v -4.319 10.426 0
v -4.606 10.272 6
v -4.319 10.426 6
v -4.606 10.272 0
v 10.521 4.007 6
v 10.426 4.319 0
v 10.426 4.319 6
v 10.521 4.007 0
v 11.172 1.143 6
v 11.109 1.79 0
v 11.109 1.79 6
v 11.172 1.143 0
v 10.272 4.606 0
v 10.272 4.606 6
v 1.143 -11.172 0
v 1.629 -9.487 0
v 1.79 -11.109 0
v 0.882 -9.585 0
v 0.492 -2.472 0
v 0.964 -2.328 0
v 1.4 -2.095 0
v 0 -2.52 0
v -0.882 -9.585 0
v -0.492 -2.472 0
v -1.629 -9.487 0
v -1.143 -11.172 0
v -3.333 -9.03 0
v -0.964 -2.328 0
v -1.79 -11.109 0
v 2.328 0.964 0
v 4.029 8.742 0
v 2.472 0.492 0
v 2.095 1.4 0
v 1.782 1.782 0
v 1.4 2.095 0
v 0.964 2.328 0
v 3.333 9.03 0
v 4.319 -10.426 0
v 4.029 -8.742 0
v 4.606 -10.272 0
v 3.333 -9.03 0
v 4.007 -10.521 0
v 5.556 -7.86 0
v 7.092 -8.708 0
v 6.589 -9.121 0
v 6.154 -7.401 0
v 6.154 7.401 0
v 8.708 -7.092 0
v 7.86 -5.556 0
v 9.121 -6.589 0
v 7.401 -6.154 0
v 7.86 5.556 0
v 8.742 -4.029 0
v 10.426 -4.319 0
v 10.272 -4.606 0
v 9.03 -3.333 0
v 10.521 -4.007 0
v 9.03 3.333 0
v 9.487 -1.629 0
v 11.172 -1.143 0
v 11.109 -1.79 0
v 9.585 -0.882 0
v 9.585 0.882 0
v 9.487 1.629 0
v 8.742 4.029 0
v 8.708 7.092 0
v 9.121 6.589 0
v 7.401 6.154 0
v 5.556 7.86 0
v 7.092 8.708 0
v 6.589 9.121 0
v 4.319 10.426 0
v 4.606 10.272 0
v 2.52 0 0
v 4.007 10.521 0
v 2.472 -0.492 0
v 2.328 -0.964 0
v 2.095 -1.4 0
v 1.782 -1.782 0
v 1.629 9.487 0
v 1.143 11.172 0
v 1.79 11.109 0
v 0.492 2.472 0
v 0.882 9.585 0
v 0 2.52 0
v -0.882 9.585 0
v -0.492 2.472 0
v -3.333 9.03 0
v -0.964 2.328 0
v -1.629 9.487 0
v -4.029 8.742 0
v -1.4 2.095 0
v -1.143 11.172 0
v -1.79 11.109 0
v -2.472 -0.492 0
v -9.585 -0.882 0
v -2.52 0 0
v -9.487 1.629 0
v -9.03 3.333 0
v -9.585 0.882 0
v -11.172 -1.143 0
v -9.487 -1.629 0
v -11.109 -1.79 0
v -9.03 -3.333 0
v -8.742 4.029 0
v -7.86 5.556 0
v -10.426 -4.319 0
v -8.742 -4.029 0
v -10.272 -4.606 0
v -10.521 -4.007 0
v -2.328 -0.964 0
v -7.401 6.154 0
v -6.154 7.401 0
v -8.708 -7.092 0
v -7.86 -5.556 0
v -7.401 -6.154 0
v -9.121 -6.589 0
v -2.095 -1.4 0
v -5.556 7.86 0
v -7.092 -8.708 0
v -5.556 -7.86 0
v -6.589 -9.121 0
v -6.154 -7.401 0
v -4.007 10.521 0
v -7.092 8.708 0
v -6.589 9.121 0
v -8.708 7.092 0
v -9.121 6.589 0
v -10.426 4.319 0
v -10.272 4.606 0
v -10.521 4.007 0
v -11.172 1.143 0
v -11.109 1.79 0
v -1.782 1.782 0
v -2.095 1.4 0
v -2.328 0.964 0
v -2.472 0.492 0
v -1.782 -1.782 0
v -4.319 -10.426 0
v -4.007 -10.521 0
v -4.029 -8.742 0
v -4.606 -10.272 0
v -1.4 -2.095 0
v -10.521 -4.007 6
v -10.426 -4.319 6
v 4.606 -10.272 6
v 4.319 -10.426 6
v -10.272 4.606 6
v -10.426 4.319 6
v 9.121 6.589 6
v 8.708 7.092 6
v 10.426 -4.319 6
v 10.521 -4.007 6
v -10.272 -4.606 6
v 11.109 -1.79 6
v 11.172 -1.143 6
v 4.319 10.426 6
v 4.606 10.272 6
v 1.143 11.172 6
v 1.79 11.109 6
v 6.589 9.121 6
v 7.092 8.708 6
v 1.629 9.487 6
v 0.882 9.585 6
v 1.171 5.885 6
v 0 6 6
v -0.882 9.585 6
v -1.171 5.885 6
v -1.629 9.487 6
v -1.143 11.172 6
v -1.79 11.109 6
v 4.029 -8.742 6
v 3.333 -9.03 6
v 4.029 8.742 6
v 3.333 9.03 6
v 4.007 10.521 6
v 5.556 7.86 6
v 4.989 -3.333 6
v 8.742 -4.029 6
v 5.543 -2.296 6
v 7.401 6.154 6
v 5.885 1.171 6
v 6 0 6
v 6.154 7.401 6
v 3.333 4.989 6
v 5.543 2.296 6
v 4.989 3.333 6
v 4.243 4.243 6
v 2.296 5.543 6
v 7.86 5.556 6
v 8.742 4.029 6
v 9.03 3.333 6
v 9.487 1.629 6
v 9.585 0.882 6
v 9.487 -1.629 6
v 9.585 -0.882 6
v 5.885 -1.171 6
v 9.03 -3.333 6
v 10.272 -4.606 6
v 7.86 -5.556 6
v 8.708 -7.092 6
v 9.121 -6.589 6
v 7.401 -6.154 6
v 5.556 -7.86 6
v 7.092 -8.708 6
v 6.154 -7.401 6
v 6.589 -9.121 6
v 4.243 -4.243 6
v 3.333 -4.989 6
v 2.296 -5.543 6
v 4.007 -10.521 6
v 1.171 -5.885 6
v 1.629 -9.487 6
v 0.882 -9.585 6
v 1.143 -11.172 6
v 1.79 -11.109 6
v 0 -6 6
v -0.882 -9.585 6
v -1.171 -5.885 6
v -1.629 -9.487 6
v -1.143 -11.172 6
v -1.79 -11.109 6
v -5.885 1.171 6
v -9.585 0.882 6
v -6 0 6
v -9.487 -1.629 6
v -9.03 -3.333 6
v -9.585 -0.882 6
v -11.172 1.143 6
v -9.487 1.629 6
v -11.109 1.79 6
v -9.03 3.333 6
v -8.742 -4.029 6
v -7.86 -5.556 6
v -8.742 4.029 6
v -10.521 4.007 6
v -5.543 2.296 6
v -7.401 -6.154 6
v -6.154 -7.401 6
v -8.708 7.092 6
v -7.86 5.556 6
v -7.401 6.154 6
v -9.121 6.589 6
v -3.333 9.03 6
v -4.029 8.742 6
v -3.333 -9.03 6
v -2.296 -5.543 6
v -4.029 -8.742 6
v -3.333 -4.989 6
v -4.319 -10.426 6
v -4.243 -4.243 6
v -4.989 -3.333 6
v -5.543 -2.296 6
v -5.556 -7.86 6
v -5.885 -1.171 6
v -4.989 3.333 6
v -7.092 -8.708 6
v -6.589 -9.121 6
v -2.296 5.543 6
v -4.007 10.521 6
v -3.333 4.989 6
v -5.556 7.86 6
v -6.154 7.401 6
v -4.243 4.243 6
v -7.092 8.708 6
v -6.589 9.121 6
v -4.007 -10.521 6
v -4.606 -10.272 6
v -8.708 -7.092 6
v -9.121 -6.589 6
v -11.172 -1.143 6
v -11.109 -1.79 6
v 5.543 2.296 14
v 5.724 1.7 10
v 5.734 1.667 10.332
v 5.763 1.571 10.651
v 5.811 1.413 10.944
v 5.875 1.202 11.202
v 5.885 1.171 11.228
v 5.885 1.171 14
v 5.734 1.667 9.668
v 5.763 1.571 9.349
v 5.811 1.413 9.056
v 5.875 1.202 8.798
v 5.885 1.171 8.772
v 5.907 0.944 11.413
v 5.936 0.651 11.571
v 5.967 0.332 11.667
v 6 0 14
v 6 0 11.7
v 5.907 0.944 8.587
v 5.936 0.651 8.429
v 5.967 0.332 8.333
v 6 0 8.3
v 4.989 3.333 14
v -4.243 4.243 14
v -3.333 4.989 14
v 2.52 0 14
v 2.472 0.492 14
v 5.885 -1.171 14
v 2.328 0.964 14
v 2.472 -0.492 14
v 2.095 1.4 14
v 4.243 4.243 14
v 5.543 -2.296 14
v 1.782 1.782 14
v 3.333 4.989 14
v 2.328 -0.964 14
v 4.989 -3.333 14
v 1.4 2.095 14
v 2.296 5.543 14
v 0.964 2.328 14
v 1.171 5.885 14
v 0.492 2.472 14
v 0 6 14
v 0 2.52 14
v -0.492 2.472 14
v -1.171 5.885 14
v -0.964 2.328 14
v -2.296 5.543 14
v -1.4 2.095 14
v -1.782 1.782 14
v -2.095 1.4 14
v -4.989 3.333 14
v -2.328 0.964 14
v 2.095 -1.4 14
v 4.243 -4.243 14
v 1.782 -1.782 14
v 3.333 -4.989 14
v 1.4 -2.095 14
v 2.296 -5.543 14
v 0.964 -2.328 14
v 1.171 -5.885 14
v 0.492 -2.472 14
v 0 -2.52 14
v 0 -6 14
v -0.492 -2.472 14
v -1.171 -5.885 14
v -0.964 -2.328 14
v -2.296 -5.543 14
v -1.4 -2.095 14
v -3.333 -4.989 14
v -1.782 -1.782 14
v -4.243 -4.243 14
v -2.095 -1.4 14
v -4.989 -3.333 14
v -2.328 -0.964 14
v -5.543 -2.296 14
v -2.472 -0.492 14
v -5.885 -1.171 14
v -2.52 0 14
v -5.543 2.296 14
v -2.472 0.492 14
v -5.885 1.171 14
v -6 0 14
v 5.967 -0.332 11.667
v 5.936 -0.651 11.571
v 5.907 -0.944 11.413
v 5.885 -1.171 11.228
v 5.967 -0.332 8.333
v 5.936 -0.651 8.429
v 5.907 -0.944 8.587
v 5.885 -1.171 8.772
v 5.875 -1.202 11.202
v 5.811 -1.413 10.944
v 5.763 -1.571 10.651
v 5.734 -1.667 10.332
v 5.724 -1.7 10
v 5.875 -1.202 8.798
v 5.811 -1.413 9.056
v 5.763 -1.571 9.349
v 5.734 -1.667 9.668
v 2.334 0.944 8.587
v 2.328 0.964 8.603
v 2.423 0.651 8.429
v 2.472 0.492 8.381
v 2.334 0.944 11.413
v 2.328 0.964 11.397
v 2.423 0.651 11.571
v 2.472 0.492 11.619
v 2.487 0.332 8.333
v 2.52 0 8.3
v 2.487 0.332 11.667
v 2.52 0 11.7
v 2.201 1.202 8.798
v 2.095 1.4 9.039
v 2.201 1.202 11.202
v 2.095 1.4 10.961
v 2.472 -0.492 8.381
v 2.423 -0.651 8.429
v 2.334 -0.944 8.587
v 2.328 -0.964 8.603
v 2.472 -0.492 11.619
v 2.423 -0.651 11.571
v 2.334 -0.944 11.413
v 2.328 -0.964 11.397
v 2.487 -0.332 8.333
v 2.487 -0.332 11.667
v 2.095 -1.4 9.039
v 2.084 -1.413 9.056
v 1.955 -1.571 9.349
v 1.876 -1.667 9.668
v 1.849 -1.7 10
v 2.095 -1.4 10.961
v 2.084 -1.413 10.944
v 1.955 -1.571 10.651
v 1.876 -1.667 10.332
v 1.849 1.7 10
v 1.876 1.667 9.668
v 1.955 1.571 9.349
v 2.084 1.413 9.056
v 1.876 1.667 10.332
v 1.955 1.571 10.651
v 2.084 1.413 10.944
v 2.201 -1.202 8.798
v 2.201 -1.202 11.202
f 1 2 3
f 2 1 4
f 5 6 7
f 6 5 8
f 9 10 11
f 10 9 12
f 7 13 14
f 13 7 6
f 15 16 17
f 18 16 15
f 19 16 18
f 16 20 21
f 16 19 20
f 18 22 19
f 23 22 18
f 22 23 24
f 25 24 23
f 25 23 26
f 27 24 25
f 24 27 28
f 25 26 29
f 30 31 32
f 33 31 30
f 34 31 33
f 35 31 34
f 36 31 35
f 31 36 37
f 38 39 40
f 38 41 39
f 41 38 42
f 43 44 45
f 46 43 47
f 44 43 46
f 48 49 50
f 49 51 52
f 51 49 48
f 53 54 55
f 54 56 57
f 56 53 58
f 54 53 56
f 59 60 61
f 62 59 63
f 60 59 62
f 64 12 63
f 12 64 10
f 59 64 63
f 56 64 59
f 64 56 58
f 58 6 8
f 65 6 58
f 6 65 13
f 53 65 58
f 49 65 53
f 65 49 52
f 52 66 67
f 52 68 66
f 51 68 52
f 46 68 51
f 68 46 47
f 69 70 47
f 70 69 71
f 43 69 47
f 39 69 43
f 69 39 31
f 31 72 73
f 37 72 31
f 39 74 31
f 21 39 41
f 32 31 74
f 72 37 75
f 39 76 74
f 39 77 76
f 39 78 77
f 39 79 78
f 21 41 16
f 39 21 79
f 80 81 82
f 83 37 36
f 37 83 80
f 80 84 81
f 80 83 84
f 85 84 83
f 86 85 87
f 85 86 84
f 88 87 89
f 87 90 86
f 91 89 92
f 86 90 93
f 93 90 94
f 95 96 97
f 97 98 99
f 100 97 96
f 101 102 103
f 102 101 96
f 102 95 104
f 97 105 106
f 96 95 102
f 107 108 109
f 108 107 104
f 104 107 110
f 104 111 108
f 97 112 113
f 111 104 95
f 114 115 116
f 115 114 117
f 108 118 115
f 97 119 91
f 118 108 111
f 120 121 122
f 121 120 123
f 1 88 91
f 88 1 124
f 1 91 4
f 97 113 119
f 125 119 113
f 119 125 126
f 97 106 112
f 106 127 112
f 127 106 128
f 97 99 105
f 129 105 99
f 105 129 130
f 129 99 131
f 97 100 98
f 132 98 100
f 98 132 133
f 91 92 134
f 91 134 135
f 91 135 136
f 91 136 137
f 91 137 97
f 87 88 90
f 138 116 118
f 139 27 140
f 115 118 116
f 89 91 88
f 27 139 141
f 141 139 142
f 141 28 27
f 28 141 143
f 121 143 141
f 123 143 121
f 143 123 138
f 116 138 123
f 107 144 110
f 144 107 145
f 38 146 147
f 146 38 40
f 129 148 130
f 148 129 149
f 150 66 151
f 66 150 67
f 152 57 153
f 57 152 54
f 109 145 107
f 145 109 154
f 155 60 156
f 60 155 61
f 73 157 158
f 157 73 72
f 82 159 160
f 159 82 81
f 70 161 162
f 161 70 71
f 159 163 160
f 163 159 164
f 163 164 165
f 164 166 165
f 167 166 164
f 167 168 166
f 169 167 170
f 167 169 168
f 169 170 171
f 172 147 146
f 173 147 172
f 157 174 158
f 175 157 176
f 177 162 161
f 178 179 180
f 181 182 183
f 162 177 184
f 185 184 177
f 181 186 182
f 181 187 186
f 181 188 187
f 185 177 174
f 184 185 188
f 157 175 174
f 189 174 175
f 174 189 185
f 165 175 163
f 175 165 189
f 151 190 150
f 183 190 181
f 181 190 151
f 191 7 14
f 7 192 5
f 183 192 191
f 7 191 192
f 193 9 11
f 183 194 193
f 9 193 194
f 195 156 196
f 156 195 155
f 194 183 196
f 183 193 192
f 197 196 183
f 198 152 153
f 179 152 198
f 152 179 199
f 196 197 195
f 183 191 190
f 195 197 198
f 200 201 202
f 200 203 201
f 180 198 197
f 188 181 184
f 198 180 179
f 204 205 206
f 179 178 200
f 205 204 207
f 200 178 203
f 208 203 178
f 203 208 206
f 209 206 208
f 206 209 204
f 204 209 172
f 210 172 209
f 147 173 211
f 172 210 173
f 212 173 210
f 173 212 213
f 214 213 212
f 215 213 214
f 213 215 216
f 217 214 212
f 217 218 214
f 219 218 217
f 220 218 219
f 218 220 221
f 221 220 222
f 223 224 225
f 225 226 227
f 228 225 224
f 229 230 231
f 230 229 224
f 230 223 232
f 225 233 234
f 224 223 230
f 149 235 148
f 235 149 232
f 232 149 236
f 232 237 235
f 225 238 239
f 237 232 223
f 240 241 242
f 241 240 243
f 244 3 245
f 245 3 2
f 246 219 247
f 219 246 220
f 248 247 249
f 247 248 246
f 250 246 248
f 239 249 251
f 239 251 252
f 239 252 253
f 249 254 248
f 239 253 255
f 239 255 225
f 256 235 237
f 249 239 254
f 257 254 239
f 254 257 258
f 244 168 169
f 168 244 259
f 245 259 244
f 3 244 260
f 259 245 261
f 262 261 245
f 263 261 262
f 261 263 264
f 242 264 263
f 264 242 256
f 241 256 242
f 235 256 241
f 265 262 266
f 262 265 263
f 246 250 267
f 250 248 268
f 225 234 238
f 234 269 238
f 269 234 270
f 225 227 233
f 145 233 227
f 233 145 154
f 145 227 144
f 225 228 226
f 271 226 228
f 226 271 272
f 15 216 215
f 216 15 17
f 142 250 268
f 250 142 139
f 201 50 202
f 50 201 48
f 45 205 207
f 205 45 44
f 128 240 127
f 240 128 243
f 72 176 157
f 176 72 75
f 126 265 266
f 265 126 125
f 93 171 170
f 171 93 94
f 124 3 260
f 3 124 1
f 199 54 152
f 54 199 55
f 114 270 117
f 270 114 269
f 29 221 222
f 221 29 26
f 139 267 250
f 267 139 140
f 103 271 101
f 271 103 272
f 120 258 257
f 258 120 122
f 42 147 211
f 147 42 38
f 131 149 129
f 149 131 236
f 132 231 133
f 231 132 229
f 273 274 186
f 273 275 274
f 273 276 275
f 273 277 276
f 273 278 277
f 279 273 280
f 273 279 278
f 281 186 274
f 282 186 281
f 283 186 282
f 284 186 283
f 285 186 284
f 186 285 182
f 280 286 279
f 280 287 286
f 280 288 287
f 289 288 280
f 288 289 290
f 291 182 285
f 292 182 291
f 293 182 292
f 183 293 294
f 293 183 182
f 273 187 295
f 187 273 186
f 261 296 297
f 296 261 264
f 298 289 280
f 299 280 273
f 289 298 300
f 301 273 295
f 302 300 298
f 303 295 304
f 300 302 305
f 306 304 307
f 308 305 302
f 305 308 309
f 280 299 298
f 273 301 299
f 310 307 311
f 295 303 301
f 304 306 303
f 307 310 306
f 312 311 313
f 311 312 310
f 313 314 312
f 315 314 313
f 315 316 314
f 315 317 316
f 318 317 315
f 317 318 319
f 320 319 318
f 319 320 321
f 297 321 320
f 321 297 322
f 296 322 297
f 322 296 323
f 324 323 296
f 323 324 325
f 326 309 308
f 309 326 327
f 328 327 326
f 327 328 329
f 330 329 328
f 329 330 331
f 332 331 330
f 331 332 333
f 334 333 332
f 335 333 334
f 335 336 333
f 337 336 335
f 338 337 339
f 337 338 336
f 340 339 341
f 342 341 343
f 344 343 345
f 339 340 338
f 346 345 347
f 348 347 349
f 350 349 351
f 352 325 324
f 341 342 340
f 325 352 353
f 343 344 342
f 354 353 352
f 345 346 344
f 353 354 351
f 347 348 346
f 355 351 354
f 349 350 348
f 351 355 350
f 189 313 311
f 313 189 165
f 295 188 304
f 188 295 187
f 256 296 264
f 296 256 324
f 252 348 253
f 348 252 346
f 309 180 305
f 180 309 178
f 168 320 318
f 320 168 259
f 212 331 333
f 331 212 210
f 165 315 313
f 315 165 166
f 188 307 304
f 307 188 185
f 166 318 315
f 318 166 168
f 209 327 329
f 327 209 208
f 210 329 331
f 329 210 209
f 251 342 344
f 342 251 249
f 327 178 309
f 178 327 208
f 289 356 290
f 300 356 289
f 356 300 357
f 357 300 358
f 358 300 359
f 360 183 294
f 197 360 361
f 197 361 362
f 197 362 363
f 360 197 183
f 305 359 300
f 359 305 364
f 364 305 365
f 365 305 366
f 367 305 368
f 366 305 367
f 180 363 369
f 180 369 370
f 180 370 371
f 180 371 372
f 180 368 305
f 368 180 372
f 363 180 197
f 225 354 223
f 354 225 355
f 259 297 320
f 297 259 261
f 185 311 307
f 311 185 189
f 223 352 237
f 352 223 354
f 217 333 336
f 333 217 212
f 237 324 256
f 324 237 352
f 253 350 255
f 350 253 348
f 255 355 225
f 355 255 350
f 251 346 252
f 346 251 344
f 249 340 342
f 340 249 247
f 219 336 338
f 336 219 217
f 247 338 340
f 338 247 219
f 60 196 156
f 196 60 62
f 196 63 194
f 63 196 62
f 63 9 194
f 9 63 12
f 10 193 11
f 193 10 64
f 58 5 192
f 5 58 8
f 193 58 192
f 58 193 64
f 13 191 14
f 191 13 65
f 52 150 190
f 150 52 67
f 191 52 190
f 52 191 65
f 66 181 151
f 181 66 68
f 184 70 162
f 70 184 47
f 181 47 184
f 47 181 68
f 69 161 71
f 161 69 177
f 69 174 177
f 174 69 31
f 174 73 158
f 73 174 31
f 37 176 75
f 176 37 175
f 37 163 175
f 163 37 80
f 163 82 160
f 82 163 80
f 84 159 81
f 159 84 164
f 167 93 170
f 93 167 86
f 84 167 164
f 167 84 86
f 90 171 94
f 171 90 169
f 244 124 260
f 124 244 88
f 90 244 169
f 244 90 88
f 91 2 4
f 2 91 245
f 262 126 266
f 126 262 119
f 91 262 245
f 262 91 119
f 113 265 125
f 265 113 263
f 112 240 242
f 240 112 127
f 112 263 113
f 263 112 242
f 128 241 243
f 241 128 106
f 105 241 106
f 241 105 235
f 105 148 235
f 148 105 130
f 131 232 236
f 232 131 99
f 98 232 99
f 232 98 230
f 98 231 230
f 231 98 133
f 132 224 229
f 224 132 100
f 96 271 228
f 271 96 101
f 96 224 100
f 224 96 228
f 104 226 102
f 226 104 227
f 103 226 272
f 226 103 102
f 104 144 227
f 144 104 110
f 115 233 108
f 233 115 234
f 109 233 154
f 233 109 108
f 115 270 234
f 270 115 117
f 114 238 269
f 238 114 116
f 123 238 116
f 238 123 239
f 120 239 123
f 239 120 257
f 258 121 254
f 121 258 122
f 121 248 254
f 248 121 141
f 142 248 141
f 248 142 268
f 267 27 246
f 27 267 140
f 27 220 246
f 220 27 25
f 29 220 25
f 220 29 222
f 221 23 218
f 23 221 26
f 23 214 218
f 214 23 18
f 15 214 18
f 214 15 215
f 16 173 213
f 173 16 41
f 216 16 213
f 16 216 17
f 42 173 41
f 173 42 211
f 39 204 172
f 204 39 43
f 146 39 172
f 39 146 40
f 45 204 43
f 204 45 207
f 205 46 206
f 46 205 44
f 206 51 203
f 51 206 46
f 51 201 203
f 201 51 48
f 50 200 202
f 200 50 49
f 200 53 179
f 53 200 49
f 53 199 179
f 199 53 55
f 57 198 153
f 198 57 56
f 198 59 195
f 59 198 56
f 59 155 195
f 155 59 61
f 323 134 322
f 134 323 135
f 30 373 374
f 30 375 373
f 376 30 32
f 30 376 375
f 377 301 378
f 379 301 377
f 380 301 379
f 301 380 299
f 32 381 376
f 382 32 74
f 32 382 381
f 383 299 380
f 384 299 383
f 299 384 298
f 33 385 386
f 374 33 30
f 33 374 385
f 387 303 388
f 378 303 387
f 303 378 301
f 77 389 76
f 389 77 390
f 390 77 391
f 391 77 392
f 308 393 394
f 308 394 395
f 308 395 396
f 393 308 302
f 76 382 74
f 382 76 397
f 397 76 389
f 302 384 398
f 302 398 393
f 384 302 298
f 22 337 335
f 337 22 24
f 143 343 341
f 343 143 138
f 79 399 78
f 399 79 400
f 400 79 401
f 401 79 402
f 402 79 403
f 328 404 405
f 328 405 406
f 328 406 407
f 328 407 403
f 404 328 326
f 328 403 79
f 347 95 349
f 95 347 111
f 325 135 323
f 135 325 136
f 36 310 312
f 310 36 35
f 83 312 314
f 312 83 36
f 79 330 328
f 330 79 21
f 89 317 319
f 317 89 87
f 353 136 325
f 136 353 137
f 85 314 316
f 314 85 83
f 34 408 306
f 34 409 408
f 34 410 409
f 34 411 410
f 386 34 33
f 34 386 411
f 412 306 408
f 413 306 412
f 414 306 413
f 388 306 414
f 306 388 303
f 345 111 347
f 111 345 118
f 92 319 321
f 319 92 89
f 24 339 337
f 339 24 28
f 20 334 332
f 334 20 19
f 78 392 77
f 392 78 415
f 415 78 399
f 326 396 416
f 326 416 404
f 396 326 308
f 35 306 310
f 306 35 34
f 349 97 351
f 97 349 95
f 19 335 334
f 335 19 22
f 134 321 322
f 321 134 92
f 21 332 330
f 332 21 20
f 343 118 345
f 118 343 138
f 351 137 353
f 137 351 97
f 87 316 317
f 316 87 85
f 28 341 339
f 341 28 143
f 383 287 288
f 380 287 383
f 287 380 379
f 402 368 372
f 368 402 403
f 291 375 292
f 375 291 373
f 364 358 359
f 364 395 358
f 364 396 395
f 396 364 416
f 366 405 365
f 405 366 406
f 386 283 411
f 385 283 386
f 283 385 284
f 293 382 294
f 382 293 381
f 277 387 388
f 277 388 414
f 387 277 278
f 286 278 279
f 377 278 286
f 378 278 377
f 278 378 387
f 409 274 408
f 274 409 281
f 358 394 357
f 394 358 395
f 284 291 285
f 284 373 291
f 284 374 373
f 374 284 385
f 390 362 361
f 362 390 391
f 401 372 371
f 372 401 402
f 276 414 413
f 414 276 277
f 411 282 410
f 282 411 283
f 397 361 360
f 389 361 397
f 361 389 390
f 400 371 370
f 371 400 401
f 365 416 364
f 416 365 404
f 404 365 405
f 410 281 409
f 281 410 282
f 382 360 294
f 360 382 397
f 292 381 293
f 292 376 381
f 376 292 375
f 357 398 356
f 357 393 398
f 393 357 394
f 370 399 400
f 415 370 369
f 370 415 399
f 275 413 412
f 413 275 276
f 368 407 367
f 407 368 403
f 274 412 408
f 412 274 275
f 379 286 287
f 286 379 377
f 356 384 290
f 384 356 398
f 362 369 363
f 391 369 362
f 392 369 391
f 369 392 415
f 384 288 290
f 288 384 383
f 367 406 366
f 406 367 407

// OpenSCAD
$fn = 32;

// ----------------------------------------------------------------------
// Timing pulley: GT3 24T, pitch 3 mm, 22.57 mm x 14 mm
// ----------------------------------------------------------------------

// --- parameters (mm) ---
belt_pitch = 3;           // belt pitch
n_teeth = 24;             // number of grooves
rim_w = 6;                // belt width between the flanges
tip_d = 22.57;            // tip circle diameter
root_d = 20.37;           // groove bottom diameter
groove_h = 1.1;           // groove depth
tooth_w = 2.1;            // groove width at the tip circle
shaft_d = 5.04;           // shaft bore
hub_d = 12;               // hub diameter
hub_h = 8;                // hub above the flange
bottom_z = 0;             // lowest point of the pulley
top_z = 14;               // highest point of the pulley
set_d = 3.4;              // set screw tap hole

module rim() {
  cylinder(h = rim_w, d = tip_d);
}

module groove_cutter() {
  /* belt tooth groove: deeper than wide, cut through the belt width */
  translate([root_d / 2, 0, 0])
    linear_extrude(height = rim_w)
      polygon(points = [[-0.6, -tooth_w * 0.42], [groove_h + 0.6, -tooth_w * 0.6],
                        [groove_h + 0.6, tooth_w * 0.6], [-0.6, tooth_w * 0.42]]);
}

module hub() {
  translate([0, 0, bottom_z]) cylinder(h = top_z - bottom_z, d = hub_d);
}

difference() {
  union() {
    rim();
    hub();
  }
  for (i = [0 : n_teeth - 1]) rotate([0, 0, i * 360 / n_teeth]) groove_cutter();
  translate([0, 0, bottom_z - 1]) cylinder(h = top_z - bottom_z + 2, d = shaft_d);
  translate([-1, 0, top_z - hub_h * 0.5]) rotate([0, 90, 0]) cylinder(h = hub_d / 2 + 3, d = set_d);
}
